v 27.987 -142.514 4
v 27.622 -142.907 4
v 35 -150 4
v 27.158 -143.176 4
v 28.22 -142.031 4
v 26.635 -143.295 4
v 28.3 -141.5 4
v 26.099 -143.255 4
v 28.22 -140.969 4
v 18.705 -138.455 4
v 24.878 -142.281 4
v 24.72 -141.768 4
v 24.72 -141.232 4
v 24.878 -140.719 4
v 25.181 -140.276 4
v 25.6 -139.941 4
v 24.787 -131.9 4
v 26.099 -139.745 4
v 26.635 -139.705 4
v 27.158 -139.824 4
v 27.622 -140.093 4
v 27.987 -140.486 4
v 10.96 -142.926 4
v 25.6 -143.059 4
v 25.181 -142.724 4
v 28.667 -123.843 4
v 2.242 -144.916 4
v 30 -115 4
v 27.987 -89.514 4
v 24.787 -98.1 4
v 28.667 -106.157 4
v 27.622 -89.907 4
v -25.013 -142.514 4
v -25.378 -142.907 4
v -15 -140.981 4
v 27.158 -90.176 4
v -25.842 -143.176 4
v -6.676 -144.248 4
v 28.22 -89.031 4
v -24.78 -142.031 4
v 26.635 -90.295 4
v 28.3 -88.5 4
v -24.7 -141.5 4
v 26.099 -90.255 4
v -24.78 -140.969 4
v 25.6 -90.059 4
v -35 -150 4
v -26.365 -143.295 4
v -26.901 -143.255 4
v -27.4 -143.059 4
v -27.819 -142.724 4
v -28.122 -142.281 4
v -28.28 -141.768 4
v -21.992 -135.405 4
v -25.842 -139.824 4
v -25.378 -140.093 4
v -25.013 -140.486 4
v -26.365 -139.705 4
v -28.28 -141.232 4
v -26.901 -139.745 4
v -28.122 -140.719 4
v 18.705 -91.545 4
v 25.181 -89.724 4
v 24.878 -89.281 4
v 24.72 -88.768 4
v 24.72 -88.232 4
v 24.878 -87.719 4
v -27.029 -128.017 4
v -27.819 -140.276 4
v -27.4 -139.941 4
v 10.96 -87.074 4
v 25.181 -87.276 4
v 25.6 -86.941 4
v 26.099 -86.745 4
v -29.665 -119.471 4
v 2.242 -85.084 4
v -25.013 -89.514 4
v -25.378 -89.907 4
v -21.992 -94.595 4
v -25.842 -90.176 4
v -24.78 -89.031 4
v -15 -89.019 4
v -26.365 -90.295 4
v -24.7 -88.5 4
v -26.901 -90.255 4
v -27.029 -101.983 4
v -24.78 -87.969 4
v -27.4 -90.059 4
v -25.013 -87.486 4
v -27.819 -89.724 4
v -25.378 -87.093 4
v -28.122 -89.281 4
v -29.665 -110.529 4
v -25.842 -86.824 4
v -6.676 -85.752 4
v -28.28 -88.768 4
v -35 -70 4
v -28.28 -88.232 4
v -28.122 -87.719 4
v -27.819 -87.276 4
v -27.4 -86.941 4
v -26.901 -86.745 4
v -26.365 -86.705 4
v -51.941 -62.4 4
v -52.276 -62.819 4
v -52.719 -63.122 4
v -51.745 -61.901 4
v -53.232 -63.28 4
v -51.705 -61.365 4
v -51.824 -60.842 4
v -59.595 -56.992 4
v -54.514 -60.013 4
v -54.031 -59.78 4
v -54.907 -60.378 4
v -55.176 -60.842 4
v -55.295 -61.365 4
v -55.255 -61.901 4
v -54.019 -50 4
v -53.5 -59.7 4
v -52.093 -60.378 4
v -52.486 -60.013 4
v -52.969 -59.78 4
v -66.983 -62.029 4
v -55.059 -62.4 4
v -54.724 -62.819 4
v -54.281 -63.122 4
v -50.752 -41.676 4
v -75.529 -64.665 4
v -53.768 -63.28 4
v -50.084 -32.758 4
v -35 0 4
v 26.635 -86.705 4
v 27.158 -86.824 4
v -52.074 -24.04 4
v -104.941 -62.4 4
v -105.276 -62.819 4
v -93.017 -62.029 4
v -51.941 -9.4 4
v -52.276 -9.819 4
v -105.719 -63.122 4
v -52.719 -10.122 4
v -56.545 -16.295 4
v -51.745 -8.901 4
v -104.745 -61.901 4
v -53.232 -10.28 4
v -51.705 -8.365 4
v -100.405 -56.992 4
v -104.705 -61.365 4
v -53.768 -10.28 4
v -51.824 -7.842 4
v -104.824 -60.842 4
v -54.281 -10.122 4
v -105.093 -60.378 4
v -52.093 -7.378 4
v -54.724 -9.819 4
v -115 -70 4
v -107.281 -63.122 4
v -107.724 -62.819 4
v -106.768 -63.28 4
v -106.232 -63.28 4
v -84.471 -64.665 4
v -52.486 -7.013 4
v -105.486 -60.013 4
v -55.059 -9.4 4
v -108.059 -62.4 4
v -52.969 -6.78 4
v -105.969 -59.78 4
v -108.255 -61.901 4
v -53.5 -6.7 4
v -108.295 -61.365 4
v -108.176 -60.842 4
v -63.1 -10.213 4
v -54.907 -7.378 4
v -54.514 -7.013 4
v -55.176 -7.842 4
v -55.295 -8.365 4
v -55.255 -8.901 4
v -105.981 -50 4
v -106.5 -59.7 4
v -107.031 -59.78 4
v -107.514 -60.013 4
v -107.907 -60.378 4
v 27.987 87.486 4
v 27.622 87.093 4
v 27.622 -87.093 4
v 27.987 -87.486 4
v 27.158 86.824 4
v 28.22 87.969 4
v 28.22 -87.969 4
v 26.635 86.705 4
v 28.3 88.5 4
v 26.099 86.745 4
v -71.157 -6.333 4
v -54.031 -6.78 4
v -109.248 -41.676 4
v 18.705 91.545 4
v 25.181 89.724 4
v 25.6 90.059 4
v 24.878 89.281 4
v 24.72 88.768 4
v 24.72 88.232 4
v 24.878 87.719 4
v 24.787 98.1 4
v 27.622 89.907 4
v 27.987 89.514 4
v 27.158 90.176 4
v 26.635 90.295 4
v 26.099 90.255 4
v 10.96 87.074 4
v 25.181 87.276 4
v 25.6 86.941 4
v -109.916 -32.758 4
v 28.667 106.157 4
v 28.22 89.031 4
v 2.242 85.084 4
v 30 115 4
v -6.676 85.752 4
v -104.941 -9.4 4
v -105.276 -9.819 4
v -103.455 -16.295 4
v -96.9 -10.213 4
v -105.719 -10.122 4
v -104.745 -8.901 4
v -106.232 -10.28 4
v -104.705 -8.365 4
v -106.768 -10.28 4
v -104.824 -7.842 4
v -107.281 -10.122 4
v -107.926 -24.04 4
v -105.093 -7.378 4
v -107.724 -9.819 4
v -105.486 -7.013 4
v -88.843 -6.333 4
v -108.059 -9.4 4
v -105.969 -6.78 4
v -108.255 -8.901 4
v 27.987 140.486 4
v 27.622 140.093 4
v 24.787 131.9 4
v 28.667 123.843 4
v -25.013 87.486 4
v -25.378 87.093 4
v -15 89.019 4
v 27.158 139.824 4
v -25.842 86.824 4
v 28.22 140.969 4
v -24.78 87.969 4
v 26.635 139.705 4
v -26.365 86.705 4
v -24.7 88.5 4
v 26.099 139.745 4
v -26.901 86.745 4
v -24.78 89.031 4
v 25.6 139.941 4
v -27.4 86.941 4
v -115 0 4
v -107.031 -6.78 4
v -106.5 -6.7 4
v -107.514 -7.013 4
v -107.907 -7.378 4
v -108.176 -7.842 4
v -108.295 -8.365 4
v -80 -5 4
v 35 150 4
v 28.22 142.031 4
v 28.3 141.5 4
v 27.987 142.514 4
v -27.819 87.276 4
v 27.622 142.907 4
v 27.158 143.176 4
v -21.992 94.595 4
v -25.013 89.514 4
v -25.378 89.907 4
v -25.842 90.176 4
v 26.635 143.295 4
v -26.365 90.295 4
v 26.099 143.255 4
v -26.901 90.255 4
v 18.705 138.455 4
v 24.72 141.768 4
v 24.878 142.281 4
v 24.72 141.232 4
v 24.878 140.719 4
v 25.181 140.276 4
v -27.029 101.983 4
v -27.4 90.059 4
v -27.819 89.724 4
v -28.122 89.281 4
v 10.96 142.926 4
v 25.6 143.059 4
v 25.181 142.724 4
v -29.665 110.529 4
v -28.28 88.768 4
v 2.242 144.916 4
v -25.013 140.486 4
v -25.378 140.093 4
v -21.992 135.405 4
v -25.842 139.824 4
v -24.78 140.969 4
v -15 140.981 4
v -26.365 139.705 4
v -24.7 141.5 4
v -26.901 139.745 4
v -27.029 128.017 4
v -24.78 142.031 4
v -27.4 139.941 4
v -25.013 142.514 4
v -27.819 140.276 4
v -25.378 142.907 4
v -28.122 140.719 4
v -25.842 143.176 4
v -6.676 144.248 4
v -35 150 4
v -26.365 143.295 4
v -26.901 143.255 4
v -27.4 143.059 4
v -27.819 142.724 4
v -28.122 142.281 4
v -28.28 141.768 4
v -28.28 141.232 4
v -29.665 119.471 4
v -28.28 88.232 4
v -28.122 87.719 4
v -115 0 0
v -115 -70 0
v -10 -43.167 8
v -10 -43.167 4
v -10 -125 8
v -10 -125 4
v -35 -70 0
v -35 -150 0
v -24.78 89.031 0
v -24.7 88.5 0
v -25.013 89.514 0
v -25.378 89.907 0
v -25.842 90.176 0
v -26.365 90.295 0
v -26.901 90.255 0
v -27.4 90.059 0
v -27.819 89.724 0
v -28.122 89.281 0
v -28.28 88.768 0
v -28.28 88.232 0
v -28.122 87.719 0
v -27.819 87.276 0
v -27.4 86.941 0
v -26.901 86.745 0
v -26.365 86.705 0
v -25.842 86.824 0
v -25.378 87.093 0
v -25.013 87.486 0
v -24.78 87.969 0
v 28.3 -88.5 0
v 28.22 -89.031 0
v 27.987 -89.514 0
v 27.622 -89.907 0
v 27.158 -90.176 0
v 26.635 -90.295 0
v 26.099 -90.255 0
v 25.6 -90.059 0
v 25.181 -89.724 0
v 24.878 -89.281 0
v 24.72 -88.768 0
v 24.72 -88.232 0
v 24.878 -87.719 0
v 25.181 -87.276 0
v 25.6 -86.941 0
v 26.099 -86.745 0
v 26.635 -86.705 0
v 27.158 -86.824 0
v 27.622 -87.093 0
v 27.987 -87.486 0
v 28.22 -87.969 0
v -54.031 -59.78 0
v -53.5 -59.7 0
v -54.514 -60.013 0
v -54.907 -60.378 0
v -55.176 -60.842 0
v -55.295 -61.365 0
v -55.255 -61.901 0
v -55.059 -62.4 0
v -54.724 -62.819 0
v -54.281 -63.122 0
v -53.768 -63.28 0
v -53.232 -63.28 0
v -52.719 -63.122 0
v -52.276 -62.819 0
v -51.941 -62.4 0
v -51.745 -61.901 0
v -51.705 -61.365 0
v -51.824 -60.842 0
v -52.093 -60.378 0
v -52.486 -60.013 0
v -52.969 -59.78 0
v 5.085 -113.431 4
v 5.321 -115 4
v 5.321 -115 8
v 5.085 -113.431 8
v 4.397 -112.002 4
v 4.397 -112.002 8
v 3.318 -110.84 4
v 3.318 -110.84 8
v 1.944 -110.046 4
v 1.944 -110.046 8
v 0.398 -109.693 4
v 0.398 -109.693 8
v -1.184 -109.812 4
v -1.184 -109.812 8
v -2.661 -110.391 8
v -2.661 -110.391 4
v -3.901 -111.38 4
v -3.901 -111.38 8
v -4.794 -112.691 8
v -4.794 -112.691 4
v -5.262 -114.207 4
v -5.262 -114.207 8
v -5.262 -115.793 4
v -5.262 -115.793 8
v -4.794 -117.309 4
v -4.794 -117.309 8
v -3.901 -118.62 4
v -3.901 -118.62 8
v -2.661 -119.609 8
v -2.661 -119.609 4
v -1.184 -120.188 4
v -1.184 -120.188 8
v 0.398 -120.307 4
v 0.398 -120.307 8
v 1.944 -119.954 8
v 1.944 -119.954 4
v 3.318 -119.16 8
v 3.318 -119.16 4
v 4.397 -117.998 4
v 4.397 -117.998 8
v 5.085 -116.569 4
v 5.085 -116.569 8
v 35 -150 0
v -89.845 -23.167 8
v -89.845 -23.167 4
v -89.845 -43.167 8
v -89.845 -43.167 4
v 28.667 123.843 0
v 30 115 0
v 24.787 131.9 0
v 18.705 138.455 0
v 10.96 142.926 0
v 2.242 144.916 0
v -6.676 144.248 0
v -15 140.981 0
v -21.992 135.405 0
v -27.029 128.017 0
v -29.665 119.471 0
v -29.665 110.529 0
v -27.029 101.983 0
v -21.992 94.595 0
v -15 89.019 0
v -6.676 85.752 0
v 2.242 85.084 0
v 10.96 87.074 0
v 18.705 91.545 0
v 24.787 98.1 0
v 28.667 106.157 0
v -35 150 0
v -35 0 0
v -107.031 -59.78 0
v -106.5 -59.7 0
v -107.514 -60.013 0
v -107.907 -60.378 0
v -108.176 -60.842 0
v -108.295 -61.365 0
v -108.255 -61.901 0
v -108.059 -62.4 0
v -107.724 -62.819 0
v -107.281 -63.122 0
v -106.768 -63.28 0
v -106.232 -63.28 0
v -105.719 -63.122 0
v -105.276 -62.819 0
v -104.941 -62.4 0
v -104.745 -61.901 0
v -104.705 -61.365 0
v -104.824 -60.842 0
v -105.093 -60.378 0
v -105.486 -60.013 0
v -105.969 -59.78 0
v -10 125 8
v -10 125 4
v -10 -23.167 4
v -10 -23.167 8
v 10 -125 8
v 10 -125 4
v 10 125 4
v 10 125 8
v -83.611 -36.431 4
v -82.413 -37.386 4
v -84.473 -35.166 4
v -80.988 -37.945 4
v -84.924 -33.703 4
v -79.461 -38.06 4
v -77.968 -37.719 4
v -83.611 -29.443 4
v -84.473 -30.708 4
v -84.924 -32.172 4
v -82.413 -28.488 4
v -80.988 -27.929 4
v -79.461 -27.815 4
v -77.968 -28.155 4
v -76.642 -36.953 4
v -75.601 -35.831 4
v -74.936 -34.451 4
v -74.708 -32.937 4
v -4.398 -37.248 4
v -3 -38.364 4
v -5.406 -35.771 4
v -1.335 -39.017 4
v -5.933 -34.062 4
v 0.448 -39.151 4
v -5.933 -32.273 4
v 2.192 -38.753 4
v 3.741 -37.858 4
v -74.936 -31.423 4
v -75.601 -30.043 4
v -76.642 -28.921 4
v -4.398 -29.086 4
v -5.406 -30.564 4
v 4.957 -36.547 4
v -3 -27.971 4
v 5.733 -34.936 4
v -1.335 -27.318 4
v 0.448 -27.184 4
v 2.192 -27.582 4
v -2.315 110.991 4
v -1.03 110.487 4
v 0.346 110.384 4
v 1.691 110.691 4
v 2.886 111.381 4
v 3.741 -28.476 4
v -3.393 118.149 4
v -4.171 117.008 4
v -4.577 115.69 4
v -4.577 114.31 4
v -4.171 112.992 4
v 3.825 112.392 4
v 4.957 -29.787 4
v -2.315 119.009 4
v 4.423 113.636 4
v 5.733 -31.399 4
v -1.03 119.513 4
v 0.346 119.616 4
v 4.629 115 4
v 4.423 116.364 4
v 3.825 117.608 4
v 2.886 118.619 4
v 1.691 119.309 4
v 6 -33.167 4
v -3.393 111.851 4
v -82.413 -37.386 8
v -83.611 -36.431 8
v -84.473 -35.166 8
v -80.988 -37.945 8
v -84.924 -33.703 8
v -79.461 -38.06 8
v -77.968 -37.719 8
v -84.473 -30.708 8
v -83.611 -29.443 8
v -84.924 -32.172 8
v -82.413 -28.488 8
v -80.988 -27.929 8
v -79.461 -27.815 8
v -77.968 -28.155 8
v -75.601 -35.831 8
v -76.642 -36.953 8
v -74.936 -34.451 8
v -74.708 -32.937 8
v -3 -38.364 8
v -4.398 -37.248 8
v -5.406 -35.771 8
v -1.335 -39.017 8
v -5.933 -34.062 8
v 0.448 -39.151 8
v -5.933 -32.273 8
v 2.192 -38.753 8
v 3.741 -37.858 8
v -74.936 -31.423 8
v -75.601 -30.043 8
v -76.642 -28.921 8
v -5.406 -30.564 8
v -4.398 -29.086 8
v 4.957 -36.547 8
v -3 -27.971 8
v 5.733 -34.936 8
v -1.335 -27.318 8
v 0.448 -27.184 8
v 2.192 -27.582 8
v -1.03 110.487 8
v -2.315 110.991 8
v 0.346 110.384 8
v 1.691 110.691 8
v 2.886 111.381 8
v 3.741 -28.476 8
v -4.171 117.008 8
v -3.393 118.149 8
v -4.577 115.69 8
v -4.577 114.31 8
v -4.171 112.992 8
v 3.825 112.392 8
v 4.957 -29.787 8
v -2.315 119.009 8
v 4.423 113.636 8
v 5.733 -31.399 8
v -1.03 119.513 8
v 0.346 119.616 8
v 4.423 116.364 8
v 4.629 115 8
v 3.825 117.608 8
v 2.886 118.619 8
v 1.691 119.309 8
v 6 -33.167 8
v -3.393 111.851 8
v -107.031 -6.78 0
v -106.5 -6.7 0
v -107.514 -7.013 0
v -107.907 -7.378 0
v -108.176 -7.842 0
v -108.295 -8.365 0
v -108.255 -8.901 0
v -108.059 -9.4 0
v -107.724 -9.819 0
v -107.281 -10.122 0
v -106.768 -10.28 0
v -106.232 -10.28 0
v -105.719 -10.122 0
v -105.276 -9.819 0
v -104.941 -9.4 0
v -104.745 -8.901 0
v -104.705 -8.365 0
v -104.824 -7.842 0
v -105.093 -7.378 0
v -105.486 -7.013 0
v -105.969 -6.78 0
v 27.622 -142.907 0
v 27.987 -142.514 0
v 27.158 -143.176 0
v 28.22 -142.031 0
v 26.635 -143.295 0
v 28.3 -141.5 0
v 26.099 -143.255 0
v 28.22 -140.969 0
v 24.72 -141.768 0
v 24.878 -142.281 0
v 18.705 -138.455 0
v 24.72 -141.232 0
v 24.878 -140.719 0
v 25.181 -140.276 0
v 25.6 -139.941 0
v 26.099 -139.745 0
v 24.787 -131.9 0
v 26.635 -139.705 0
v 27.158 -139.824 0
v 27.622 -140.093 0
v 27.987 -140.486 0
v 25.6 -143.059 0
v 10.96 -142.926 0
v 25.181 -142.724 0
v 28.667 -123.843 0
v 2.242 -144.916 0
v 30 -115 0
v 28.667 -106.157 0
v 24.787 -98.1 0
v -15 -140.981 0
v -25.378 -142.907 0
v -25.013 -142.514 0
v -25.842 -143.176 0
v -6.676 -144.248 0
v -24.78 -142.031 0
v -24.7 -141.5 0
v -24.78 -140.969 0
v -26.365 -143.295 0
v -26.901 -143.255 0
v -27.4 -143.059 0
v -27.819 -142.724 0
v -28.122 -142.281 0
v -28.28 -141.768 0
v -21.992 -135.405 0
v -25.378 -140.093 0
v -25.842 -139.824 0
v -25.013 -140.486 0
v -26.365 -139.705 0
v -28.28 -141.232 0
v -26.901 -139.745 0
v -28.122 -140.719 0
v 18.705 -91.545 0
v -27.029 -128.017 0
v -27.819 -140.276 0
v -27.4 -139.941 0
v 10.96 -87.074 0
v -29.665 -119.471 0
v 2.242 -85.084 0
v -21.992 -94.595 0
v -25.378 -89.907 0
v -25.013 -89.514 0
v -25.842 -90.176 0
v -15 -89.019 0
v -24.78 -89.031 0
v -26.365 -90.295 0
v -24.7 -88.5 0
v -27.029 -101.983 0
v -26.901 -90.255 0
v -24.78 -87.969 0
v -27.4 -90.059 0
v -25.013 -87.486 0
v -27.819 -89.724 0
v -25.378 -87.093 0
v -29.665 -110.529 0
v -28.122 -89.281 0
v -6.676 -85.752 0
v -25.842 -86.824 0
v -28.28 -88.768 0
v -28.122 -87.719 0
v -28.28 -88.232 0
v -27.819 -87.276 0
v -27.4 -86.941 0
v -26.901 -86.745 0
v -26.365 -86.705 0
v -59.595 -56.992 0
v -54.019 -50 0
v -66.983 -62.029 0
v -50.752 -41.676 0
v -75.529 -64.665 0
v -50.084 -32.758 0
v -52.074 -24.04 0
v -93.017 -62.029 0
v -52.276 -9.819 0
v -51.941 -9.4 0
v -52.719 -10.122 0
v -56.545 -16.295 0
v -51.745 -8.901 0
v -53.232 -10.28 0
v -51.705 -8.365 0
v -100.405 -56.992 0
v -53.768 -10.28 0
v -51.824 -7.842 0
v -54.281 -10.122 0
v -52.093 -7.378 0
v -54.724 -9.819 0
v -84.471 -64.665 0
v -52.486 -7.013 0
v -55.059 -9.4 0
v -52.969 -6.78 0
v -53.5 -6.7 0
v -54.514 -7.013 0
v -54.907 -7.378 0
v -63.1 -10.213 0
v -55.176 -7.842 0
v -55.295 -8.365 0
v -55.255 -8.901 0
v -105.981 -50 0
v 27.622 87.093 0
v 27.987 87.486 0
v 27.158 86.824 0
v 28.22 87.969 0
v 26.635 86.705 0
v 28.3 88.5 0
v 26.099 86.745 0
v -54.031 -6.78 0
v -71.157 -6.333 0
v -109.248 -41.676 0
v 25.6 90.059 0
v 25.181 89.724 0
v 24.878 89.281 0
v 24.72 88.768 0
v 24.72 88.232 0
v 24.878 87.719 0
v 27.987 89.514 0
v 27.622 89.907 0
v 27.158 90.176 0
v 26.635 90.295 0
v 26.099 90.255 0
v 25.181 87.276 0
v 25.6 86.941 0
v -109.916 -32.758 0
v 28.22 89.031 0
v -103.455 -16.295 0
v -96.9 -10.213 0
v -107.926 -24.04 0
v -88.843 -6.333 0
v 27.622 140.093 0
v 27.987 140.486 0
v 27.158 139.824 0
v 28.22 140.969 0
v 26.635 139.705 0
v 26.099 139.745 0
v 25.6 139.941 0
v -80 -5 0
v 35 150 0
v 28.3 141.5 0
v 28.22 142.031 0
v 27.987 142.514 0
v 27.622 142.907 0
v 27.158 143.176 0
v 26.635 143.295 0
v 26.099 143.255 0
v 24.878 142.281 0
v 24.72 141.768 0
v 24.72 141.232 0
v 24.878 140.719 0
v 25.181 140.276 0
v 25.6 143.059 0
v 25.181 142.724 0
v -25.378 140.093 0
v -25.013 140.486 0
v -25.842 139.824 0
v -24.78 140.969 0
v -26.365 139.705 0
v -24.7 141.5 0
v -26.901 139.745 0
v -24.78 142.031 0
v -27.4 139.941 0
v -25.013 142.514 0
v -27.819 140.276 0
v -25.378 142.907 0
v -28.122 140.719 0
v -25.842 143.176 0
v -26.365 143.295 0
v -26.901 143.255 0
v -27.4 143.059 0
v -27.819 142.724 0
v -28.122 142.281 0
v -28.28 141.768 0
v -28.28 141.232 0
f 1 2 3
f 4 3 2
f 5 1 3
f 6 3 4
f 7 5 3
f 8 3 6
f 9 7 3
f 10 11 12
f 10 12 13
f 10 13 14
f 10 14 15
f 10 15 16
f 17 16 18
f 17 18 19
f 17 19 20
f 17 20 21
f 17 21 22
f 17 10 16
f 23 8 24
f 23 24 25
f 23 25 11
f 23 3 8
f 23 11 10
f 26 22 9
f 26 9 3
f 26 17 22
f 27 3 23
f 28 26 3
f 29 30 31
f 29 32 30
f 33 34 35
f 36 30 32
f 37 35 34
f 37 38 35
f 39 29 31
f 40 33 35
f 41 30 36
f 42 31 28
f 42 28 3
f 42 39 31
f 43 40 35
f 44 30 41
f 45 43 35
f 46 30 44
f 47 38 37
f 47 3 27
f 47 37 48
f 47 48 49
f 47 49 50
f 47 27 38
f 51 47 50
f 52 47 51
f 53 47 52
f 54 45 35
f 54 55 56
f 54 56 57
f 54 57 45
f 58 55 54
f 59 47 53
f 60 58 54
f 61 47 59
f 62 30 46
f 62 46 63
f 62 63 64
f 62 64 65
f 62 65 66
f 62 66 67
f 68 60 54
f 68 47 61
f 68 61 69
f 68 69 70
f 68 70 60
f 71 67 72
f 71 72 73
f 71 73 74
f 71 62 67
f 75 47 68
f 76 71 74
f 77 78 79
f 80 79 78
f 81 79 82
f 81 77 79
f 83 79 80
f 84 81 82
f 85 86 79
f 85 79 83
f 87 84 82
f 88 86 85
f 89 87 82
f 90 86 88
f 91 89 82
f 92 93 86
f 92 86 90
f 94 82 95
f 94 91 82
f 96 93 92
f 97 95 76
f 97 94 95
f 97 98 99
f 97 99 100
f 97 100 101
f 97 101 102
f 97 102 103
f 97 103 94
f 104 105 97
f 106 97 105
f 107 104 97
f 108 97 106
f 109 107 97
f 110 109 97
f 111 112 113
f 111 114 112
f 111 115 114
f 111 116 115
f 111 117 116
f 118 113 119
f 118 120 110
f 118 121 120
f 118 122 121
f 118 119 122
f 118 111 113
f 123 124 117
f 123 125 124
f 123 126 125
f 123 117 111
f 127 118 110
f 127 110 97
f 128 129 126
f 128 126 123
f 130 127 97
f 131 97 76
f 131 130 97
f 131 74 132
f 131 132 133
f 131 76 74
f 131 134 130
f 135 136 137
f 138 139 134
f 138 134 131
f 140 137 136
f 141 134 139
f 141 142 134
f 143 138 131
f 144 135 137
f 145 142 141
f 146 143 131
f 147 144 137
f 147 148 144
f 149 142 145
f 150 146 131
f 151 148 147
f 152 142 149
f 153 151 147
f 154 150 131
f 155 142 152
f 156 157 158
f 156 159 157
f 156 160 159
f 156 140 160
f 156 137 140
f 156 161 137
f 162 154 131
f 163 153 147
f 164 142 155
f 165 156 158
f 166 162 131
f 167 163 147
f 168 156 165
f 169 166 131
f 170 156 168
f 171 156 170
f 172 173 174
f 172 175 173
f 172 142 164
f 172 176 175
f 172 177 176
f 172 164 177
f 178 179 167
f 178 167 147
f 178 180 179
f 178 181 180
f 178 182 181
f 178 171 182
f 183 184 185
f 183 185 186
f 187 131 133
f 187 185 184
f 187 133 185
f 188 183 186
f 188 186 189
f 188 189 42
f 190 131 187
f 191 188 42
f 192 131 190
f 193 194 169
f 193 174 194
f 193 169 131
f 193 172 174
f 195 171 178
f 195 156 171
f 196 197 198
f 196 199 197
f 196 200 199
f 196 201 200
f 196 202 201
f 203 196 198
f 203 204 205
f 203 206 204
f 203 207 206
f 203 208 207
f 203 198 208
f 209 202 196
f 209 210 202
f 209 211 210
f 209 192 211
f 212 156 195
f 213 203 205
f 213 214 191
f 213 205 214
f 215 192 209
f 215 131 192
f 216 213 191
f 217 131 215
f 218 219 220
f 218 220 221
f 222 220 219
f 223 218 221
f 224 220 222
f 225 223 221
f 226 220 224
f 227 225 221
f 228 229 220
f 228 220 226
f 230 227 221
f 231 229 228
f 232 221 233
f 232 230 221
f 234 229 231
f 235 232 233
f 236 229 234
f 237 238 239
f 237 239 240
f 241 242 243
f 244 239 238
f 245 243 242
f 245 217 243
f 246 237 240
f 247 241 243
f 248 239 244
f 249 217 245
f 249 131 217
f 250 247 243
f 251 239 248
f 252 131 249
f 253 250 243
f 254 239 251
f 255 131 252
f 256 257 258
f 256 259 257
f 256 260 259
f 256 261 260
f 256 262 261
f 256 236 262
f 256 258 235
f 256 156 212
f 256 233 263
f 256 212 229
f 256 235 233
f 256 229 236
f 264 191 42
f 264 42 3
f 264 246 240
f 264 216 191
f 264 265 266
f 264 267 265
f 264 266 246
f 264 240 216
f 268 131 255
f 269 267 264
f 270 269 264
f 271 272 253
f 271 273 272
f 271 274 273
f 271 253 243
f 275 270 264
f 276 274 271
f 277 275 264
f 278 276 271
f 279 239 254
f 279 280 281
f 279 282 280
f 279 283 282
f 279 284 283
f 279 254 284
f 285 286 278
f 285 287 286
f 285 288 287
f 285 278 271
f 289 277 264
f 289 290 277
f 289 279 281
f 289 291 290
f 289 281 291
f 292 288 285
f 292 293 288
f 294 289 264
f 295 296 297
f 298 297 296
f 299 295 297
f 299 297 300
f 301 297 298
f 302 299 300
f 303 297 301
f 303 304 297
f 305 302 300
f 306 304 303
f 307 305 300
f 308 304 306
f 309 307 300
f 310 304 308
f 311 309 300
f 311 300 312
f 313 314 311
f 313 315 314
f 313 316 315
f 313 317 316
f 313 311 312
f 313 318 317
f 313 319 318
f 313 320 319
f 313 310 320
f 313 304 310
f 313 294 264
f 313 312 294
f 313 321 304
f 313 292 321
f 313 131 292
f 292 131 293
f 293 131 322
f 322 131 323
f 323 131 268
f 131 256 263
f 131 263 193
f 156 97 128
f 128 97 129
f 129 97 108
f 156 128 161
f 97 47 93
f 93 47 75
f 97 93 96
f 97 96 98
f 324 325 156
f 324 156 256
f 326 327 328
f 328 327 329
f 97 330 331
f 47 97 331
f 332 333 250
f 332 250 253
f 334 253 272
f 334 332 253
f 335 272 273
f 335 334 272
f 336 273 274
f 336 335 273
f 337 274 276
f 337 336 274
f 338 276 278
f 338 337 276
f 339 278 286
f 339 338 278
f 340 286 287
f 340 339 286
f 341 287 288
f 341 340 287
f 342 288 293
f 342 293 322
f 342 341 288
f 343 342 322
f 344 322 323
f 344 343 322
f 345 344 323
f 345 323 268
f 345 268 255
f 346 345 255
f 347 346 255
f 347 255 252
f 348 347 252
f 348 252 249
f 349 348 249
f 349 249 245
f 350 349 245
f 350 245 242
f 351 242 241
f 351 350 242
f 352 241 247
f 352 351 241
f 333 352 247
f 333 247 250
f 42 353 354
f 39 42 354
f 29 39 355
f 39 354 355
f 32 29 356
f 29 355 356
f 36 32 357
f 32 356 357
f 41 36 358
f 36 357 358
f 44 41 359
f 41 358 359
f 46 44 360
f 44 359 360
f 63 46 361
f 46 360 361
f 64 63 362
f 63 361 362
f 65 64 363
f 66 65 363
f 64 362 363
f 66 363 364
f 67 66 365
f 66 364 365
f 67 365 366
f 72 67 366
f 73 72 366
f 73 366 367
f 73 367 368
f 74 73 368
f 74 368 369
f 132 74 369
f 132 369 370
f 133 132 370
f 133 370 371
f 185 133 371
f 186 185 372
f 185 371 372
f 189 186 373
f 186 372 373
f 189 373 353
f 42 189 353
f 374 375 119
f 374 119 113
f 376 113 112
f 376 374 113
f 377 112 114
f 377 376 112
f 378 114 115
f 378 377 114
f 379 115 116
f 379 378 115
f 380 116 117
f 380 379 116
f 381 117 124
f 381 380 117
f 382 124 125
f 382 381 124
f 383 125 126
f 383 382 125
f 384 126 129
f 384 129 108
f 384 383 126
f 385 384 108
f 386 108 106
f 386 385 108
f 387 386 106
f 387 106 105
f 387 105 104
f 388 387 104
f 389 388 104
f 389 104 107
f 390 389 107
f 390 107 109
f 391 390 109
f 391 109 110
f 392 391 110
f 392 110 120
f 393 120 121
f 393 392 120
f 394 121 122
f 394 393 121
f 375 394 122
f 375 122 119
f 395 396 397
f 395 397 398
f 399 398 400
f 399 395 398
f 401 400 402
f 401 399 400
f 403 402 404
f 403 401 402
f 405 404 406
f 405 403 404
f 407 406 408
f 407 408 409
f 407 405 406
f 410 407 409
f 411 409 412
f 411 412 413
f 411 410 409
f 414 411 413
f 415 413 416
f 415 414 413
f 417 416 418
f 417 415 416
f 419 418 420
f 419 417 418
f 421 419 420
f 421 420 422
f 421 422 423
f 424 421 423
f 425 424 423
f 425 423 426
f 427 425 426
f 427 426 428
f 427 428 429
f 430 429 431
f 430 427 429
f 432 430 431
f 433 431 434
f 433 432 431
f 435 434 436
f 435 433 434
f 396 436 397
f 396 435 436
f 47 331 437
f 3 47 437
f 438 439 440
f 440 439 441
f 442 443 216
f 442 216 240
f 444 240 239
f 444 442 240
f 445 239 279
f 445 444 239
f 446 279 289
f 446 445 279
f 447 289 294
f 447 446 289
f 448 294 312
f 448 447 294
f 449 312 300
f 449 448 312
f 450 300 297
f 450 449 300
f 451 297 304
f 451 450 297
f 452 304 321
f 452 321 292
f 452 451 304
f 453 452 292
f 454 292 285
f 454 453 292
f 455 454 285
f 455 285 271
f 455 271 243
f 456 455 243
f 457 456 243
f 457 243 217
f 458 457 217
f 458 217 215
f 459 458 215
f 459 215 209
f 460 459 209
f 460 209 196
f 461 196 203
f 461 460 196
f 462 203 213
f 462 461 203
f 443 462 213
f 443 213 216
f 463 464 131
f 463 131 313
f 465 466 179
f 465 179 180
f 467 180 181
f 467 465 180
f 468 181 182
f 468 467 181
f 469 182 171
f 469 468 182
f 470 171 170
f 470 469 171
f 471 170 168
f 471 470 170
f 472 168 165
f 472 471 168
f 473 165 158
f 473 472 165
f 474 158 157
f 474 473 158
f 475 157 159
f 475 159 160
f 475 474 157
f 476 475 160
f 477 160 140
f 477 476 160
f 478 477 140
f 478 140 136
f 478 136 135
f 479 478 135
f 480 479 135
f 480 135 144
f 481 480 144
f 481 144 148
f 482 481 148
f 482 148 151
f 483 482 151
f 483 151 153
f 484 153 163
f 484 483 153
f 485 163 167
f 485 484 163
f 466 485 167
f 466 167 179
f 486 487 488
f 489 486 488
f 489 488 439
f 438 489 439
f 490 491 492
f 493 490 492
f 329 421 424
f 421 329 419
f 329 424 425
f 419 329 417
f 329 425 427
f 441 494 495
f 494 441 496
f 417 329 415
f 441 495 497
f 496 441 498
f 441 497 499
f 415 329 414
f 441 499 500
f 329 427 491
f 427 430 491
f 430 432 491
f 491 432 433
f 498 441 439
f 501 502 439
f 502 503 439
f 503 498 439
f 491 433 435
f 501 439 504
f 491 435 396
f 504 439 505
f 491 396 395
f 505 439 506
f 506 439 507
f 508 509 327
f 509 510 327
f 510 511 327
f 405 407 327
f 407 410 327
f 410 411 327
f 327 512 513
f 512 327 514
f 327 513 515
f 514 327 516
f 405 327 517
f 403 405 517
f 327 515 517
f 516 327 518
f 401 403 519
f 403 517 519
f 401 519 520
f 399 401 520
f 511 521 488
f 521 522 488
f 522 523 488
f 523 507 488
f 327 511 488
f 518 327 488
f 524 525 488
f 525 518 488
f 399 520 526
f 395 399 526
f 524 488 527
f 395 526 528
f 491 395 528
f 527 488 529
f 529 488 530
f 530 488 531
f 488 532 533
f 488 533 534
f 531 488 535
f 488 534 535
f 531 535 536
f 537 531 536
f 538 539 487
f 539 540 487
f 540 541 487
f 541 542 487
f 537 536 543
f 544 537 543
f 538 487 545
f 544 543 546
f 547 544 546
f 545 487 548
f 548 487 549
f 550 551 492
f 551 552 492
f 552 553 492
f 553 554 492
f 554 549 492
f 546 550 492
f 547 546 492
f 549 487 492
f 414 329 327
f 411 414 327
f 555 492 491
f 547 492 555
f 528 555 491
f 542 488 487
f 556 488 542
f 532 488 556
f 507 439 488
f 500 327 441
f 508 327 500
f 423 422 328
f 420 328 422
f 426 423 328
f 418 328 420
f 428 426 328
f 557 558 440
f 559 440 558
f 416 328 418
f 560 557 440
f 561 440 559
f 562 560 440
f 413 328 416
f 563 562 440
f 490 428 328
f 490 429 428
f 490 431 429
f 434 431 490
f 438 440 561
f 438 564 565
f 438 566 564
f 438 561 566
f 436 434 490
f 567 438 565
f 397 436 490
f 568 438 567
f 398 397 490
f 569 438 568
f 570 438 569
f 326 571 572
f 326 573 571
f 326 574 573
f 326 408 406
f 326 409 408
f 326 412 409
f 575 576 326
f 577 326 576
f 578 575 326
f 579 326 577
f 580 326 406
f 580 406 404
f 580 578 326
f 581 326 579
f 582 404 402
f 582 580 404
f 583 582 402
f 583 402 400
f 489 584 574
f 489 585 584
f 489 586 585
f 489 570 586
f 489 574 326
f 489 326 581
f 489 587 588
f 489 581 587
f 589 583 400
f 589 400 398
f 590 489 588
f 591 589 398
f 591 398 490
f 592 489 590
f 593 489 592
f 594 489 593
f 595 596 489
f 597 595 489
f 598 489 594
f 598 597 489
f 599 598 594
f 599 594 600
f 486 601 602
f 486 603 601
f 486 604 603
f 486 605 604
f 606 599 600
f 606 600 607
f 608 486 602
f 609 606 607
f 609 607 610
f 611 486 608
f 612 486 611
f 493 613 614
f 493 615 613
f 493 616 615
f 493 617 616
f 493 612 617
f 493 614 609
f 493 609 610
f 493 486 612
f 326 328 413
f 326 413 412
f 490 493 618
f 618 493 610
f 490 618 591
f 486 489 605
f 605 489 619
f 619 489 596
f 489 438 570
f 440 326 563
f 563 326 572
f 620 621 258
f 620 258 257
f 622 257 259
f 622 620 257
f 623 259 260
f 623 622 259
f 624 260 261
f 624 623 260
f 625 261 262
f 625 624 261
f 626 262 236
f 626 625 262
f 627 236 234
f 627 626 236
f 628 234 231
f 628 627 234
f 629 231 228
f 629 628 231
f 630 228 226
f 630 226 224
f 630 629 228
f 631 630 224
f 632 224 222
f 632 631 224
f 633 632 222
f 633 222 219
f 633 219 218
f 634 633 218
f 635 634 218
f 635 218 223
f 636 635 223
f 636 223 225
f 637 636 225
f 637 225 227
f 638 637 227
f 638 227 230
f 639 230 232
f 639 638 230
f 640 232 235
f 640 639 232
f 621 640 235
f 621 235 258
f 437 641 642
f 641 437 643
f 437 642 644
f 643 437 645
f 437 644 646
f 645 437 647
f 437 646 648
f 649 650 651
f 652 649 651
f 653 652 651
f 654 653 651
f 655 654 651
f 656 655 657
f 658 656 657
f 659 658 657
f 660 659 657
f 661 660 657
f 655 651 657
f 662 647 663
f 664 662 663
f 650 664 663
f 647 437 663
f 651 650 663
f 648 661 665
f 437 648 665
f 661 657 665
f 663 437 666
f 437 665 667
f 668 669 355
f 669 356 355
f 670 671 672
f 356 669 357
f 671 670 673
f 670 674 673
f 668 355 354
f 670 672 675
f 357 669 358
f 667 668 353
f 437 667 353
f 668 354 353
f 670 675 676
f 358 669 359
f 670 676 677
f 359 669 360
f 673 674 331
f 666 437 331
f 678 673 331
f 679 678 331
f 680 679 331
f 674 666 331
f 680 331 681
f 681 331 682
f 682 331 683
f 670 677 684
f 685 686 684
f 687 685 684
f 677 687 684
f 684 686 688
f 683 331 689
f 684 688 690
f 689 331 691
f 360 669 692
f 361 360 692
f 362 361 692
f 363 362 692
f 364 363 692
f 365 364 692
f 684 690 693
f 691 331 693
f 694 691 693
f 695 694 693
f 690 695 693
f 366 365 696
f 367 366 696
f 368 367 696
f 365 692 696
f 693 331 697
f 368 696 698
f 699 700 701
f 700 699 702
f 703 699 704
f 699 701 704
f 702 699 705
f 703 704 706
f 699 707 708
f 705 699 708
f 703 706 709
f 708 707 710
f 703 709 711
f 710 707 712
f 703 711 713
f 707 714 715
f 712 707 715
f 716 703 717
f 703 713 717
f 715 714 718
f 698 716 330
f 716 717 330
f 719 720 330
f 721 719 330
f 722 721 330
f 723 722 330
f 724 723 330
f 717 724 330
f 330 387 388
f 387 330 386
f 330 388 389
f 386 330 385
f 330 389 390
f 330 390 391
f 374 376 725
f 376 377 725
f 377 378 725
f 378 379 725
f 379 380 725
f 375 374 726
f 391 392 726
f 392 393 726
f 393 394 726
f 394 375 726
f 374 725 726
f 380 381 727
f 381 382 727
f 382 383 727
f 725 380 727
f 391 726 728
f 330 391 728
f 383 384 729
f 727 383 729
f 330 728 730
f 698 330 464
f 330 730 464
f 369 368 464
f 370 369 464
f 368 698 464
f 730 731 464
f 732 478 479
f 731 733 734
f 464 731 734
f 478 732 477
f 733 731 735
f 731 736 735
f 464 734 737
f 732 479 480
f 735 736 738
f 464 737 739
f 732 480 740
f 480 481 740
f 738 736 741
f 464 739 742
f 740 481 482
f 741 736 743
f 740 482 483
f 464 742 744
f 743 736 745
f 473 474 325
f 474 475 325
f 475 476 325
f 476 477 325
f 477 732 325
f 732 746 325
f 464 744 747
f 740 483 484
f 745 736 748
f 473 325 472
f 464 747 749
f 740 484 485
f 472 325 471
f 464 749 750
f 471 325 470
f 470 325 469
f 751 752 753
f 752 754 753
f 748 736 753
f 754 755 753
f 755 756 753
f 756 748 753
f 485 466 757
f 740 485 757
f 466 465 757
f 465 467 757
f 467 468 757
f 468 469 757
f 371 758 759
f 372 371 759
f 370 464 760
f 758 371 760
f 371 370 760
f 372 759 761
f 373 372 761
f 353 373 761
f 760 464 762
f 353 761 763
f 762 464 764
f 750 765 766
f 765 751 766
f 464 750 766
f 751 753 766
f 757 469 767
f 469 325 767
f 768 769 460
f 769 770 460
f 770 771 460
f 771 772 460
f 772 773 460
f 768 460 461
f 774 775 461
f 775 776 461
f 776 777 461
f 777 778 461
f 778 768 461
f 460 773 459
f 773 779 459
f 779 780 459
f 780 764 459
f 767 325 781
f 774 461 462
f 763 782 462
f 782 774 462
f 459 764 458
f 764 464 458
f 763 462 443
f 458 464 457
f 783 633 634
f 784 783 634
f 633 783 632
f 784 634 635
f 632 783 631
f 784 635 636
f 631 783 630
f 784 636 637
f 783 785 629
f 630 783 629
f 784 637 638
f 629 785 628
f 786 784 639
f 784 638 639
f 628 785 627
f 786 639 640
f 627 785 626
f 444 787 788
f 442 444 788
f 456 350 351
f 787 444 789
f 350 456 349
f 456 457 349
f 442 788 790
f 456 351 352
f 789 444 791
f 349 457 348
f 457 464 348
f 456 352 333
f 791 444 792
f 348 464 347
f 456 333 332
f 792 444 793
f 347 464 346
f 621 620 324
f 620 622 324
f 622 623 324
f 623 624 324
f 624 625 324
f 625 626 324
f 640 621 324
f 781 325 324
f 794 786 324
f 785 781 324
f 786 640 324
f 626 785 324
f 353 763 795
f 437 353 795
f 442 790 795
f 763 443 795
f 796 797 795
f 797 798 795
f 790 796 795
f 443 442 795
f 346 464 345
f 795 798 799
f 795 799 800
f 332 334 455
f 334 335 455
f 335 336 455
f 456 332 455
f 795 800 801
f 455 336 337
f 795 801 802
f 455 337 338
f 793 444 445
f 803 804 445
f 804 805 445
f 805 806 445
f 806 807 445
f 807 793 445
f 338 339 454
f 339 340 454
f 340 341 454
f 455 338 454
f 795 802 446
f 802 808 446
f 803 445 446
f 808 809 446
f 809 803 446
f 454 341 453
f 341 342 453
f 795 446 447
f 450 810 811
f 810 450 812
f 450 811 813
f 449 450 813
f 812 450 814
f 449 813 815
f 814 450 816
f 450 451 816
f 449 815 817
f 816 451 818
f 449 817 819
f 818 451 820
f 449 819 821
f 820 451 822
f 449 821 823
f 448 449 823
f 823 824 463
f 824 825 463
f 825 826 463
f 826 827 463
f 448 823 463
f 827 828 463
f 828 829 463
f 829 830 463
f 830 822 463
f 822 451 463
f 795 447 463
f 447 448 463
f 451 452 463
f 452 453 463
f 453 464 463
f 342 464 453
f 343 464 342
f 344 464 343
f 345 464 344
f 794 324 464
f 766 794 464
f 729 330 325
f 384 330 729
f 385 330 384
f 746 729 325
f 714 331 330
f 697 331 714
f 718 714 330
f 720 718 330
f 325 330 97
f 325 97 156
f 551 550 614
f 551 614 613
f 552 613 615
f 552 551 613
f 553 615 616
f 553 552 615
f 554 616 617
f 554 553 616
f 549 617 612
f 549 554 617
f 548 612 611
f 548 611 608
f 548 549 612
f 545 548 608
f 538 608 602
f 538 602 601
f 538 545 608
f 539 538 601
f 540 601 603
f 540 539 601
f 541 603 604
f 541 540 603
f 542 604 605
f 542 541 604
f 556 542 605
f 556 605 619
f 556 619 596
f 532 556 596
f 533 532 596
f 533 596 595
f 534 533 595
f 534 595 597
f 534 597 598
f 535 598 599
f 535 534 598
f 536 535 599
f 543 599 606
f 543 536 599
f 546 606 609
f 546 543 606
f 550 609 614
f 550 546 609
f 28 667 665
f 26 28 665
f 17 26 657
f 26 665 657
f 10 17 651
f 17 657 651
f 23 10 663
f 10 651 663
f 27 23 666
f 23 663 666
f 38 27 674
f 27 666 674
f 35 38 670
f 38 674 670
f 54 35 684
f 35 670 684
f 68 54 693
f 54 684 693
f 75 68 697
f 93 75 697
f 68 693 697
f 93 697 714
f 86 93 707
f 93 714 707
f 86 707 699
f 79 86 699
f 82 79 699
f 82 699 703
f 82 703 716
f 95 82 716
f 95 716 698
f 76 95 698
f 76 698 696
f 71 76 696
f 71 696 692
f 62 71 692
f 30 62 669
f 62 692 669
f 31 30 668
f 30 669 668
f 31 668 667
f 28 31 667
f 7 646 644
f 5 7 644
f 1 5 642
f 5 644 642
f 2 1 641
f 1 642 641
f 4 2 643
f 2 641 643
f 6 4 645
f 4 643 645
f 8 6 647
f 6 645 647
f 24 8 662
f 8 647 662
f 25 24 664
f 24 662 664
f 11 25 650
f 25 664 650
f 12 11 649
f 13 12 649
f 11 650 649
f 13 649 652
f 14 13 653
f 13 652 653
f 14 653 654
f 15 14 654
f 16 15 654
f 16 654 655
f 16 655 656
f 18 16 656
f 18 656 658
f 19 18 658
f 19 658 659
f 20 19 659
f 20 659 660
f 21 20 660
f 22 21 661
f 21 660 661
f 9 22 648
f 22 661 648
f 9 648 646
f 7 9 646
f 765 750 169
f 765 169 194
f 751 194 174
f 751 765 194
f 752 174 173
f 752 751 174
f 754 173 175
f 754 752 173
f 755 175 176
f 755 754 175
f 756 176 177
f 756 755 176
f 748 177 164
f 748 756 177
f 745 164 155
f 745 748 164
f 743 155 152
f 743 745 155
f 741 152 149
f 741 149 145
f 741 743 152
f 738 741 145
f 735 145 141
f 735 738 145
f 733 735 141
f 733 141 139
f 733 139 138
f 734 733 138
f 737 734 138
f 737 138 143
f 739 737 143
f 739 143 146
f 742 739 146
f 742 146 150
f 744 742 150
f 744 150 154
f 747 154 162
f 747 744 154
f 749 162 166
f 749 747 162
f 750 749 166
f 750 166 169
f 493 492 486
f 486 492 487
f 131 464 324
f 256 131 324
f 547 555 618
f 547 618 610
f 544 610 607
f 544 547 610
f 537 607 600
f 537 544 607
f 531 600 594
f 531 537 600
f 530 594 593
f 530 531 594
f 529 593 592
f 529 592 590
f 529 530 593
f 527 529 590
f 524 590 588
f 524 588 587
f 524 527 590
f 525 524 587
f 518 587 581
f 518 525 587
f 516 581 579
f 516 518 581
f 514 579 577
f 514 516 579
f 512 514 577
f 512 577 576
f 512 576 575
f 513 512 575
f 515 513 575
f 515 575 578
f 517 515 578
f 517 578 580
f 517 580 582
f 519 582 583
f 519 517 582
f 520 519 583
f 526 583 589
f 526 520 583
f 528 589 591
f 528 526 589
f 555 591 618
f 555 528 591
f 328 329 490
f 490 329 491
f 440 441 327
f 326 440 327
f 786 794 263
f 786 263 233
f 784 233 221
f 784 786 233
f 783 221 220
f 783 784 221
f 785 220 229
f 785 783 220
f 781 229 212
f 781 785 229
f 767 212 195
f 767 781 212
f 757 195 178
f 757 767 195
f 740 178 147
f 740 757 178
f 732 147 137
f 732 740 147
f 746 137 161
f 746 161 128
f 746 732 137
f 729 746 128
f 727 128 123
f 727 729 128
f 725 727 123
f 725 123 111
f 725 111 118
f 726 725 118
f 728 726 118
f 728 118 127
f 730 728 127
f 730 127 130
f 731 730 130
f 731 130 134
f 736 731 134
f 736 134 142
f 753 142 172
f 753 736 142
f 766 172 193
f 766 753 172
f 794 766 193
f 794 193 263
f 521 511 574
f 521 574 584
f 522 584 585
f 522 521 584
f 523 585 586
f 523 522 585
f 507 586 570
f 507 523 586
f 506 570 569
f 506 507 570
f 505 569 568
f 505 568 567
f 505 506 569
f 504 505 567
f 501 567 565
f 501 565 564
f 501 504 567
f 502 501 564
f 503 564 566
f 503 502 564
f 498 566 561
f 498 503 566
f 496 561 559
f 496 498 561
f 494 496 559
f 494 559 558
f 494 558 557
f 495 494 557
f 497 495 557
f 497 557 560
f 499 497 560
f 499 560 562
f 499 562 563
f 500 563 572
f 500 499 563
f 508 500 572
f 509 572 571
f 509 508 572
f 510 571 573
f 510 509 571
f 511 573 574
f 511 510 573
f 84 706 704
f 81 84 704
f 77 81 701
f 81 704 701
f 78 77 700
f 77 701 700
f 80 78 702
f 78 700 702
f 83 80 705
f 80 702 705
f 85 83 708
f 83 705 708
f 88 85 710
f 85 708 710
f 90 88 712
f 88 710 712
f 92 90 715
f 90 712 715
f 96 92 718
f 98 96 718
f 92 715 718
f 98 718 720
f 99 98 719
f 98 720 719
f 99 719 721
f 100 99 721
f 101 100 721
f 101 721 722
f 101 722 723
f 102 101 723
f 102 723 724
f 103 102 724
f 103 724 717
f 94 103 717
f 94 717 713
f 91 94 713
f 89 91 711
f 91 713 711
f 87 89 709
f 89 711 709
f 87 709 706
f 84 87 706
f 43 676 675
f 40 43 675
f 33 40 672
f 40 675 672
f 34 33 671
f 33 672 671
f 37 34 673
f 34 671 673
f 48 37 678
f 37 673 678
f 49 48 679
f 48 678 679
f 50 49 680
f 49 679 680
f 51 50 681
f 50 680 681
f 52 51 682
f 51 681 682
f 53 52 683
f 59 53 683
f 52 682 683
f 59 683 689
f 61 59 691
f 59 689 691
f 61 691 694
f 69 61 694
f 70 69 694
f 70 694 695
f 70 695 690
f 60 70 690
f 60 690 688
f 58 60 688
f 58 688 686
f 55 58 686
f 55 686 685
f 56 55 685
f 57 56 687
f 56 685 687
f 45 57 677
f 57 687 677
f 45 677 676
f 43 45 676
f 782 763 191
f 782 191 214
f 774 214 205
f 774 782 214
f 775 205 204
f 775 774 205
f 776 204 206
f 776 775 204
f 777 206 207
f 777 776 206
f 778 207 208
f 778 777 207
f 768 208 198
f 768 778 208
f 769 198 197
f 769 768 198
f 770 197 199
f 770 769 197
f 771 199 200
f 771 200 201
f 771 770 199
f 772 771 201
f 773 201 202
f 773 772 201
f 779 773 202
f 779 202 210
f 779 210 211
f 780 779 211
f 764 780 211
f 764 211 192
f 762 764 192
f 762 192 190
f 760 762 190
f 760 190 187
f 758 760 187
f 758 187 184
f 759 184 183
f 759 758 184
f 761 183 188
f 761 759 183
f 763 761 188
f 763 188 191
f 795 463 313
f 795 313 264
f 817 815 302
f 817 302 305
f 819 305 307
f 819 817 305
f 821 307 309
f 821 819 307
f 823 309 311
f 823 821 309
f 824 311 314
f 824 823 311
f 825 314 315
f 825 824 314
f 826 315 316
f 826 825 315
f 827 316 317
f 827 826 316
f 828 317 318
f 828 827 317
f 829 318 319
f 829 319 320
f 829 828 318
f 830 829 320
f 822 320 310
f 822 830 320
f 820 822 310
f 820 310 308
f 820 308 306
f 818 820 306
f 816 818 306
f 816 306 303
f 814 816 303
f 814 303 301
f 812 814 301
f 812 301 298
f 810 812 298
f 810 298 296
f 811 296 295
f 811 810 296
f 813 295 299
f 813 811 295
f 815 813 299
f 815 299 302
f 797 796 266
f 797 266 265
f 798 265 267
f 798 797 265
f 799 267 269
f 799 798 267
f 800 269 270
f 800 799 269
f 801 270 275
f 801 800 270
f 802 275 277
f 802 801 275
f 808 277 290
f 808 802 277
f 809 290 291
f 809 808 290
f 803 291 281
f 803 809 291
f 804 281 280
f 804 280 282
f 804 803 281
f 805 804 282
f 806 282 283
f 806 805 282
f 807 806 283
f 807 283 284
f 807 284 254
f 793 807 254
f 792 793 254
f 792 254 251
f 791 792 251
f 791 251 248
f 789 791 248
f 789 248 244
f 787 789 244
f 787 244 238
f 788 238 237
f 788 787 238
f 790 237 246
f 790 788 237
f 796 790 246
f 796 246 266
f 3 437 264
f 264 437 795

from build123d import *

# Parameters (mm, degrees)
F0_W     = 70
F0_H     = 150
F0_R     = 1.8
F0_R_2   = 30
F1_DEPTH = 4
F3_ANGLE = 270
F5_W     = 20
F5_H     = 20
F5_R     = 6
F5_R_2   = 5.3214513589
F5_R_3   = 5.1369141006
F5_R_4   = 4.6291012192
F6_DEPTH = 4


with BuildPart() as f1:
    # F0 (on Top) → F1 (new body)
    with BuildSketch(Plane.XY):
        with Locations((0, 75)):
            Rectangle(F0_W, F0_H)
        with Locations((-26.5, 88.5)):
            Circle(F0_R, mode=Mode.SUBTRACT)
        with Locations((-26.5, 141.5)):
            Circle(F0_R, mode=Mode.SUBTRACT)
        with Locations((26.5, 88.5)):
            Circle(F0_R, mode=Mode.SUBTRACT)
        with Locations((0, 115)):
            Circle(F0_R_2, mode=Mode.SUBTRACT)
        with Locations((26.5, 141.5)):
            Circle(F0_R, mode=Mode.SUBTRACT)
    extrude(amount=F1_DEPTH)


with BuildPart() as f2_1:
    # F2: instance of F1
    add(f1.part.mirror(Plane.XZ))


with BuildPart() as f3_1:
    # F3: copy of F1
    add(f1.part.rotate(Axis((35, 0, 2), (0, 0, -1)), F3_ANGLE))


with BuildPart() as f1_1:
    add(f1.part)

    # F4: union F3_1, F2_1
    add(f3_1.part)
    add(f2_1.part)


with BuildPart() as f6:
    # F5 (on face) → F6 (new body)
    with BuildSketch(Plane.XY.offset(4)):
        with Locations((0, -33.1673508024)):
            Rectangle(F5_W, F5_H)
        with Locations((0, -33.1673508024)):
            Circle(F5_R, mode=Mode.SUBTRACT)
        with BuildLine():
            Line((10, -43.1673508024), (-10, -43.1673508024))
            Line((-10, -43.1673508024), (-10, -86.7157287525))
            ThreePointArc((-10, -86.7157287525), (0, -85), (10, -86.7157287525))
            Line((10, -86.7157287525), (10, -43.1673508024))
        make_face()
        with BuildLine():
            ThreePointArc((10, -86.7157287525), (0, -85), (-10, -86.7157287525))
            Line((-10, -86.7157287525), (-10, -125))
            Line((-10, -125), (10, -125))
            Line((10, -125), (10, -86.7157287525))
        make_face()
        with Locations((0, -115)):
            Circle(F5_R_2, mode=Mode.SUBTRACT)
        with BuildLine():
            Line((-10, -43.1673508024), (-10, -23.1673508024))
            Line((-10, -23.1673508024), (-52.4321126496, -23.1673508024))
            ThreePointArc((-52.4321126496, -23.1673508024), (-50.6143179379, -28.9599925709), (-50, -35))
            ThreePointArc((-50, -35), (-50.2846406445, -39.1227925454), (-51.1331612248, -43.1673508024))
            Line((-51.1331612248, -43.1673508024), (-10, -43.1673508024))
        make_face()
        with BuildLine():
            ThreePointArc((-50, -35), (-50.6143179379, -28.9599925709), (-52.4321126496, -23.1673508024))
            Line((-52.4321126496, -23.1673508024), (-89.8449262611, -23.1673508024))
            Line((-89.8449262611, -23.1673508024), (-89.8449262611, -43.1673508024))
            Line((-89.8449262611, -43.1673508024), (-51.1331612248, -43.1673508024))
            ThreePointArc((-51.1331612248, -43.1673508024), (-50.2846406445, -39.1227925454), (-50, -35))
        make_face()
        with Locations((-79.8449262611, -32.9371653497)):
            Circle(F5_R_3, mode=Mode.SUBTRACT)
        with BuildLine():
            ThreePointArc((10, 86.7157287525), (0, 85), (-10, 86.7157287525))
            Line((-10, 86.7157287525), (-10, -23.1673508024))
            Line((-10, -23.1673508024), (10, -23.1673508024))
            Line((10, -23.1673508024), (10, 86.7157287525))
        make_face()
        with BuildLine():
            Line((10, 125), (-10, 125))
            Line((-10, 125), (-10, 86.7157287525))
            ThreePointArc((-10, 86.7157287525), (0, 85), (10, 86.7157287525))
            Line((10, 86.7157287525), (10, 125))
        make_face()
        with Locations((0, 115)):
            Circle(F5_R_4, mode=Mode.SUBTRACT)
    extrude(amount=F6_DEPTH)


solid = Compound([f1_1.part, f6.part])
